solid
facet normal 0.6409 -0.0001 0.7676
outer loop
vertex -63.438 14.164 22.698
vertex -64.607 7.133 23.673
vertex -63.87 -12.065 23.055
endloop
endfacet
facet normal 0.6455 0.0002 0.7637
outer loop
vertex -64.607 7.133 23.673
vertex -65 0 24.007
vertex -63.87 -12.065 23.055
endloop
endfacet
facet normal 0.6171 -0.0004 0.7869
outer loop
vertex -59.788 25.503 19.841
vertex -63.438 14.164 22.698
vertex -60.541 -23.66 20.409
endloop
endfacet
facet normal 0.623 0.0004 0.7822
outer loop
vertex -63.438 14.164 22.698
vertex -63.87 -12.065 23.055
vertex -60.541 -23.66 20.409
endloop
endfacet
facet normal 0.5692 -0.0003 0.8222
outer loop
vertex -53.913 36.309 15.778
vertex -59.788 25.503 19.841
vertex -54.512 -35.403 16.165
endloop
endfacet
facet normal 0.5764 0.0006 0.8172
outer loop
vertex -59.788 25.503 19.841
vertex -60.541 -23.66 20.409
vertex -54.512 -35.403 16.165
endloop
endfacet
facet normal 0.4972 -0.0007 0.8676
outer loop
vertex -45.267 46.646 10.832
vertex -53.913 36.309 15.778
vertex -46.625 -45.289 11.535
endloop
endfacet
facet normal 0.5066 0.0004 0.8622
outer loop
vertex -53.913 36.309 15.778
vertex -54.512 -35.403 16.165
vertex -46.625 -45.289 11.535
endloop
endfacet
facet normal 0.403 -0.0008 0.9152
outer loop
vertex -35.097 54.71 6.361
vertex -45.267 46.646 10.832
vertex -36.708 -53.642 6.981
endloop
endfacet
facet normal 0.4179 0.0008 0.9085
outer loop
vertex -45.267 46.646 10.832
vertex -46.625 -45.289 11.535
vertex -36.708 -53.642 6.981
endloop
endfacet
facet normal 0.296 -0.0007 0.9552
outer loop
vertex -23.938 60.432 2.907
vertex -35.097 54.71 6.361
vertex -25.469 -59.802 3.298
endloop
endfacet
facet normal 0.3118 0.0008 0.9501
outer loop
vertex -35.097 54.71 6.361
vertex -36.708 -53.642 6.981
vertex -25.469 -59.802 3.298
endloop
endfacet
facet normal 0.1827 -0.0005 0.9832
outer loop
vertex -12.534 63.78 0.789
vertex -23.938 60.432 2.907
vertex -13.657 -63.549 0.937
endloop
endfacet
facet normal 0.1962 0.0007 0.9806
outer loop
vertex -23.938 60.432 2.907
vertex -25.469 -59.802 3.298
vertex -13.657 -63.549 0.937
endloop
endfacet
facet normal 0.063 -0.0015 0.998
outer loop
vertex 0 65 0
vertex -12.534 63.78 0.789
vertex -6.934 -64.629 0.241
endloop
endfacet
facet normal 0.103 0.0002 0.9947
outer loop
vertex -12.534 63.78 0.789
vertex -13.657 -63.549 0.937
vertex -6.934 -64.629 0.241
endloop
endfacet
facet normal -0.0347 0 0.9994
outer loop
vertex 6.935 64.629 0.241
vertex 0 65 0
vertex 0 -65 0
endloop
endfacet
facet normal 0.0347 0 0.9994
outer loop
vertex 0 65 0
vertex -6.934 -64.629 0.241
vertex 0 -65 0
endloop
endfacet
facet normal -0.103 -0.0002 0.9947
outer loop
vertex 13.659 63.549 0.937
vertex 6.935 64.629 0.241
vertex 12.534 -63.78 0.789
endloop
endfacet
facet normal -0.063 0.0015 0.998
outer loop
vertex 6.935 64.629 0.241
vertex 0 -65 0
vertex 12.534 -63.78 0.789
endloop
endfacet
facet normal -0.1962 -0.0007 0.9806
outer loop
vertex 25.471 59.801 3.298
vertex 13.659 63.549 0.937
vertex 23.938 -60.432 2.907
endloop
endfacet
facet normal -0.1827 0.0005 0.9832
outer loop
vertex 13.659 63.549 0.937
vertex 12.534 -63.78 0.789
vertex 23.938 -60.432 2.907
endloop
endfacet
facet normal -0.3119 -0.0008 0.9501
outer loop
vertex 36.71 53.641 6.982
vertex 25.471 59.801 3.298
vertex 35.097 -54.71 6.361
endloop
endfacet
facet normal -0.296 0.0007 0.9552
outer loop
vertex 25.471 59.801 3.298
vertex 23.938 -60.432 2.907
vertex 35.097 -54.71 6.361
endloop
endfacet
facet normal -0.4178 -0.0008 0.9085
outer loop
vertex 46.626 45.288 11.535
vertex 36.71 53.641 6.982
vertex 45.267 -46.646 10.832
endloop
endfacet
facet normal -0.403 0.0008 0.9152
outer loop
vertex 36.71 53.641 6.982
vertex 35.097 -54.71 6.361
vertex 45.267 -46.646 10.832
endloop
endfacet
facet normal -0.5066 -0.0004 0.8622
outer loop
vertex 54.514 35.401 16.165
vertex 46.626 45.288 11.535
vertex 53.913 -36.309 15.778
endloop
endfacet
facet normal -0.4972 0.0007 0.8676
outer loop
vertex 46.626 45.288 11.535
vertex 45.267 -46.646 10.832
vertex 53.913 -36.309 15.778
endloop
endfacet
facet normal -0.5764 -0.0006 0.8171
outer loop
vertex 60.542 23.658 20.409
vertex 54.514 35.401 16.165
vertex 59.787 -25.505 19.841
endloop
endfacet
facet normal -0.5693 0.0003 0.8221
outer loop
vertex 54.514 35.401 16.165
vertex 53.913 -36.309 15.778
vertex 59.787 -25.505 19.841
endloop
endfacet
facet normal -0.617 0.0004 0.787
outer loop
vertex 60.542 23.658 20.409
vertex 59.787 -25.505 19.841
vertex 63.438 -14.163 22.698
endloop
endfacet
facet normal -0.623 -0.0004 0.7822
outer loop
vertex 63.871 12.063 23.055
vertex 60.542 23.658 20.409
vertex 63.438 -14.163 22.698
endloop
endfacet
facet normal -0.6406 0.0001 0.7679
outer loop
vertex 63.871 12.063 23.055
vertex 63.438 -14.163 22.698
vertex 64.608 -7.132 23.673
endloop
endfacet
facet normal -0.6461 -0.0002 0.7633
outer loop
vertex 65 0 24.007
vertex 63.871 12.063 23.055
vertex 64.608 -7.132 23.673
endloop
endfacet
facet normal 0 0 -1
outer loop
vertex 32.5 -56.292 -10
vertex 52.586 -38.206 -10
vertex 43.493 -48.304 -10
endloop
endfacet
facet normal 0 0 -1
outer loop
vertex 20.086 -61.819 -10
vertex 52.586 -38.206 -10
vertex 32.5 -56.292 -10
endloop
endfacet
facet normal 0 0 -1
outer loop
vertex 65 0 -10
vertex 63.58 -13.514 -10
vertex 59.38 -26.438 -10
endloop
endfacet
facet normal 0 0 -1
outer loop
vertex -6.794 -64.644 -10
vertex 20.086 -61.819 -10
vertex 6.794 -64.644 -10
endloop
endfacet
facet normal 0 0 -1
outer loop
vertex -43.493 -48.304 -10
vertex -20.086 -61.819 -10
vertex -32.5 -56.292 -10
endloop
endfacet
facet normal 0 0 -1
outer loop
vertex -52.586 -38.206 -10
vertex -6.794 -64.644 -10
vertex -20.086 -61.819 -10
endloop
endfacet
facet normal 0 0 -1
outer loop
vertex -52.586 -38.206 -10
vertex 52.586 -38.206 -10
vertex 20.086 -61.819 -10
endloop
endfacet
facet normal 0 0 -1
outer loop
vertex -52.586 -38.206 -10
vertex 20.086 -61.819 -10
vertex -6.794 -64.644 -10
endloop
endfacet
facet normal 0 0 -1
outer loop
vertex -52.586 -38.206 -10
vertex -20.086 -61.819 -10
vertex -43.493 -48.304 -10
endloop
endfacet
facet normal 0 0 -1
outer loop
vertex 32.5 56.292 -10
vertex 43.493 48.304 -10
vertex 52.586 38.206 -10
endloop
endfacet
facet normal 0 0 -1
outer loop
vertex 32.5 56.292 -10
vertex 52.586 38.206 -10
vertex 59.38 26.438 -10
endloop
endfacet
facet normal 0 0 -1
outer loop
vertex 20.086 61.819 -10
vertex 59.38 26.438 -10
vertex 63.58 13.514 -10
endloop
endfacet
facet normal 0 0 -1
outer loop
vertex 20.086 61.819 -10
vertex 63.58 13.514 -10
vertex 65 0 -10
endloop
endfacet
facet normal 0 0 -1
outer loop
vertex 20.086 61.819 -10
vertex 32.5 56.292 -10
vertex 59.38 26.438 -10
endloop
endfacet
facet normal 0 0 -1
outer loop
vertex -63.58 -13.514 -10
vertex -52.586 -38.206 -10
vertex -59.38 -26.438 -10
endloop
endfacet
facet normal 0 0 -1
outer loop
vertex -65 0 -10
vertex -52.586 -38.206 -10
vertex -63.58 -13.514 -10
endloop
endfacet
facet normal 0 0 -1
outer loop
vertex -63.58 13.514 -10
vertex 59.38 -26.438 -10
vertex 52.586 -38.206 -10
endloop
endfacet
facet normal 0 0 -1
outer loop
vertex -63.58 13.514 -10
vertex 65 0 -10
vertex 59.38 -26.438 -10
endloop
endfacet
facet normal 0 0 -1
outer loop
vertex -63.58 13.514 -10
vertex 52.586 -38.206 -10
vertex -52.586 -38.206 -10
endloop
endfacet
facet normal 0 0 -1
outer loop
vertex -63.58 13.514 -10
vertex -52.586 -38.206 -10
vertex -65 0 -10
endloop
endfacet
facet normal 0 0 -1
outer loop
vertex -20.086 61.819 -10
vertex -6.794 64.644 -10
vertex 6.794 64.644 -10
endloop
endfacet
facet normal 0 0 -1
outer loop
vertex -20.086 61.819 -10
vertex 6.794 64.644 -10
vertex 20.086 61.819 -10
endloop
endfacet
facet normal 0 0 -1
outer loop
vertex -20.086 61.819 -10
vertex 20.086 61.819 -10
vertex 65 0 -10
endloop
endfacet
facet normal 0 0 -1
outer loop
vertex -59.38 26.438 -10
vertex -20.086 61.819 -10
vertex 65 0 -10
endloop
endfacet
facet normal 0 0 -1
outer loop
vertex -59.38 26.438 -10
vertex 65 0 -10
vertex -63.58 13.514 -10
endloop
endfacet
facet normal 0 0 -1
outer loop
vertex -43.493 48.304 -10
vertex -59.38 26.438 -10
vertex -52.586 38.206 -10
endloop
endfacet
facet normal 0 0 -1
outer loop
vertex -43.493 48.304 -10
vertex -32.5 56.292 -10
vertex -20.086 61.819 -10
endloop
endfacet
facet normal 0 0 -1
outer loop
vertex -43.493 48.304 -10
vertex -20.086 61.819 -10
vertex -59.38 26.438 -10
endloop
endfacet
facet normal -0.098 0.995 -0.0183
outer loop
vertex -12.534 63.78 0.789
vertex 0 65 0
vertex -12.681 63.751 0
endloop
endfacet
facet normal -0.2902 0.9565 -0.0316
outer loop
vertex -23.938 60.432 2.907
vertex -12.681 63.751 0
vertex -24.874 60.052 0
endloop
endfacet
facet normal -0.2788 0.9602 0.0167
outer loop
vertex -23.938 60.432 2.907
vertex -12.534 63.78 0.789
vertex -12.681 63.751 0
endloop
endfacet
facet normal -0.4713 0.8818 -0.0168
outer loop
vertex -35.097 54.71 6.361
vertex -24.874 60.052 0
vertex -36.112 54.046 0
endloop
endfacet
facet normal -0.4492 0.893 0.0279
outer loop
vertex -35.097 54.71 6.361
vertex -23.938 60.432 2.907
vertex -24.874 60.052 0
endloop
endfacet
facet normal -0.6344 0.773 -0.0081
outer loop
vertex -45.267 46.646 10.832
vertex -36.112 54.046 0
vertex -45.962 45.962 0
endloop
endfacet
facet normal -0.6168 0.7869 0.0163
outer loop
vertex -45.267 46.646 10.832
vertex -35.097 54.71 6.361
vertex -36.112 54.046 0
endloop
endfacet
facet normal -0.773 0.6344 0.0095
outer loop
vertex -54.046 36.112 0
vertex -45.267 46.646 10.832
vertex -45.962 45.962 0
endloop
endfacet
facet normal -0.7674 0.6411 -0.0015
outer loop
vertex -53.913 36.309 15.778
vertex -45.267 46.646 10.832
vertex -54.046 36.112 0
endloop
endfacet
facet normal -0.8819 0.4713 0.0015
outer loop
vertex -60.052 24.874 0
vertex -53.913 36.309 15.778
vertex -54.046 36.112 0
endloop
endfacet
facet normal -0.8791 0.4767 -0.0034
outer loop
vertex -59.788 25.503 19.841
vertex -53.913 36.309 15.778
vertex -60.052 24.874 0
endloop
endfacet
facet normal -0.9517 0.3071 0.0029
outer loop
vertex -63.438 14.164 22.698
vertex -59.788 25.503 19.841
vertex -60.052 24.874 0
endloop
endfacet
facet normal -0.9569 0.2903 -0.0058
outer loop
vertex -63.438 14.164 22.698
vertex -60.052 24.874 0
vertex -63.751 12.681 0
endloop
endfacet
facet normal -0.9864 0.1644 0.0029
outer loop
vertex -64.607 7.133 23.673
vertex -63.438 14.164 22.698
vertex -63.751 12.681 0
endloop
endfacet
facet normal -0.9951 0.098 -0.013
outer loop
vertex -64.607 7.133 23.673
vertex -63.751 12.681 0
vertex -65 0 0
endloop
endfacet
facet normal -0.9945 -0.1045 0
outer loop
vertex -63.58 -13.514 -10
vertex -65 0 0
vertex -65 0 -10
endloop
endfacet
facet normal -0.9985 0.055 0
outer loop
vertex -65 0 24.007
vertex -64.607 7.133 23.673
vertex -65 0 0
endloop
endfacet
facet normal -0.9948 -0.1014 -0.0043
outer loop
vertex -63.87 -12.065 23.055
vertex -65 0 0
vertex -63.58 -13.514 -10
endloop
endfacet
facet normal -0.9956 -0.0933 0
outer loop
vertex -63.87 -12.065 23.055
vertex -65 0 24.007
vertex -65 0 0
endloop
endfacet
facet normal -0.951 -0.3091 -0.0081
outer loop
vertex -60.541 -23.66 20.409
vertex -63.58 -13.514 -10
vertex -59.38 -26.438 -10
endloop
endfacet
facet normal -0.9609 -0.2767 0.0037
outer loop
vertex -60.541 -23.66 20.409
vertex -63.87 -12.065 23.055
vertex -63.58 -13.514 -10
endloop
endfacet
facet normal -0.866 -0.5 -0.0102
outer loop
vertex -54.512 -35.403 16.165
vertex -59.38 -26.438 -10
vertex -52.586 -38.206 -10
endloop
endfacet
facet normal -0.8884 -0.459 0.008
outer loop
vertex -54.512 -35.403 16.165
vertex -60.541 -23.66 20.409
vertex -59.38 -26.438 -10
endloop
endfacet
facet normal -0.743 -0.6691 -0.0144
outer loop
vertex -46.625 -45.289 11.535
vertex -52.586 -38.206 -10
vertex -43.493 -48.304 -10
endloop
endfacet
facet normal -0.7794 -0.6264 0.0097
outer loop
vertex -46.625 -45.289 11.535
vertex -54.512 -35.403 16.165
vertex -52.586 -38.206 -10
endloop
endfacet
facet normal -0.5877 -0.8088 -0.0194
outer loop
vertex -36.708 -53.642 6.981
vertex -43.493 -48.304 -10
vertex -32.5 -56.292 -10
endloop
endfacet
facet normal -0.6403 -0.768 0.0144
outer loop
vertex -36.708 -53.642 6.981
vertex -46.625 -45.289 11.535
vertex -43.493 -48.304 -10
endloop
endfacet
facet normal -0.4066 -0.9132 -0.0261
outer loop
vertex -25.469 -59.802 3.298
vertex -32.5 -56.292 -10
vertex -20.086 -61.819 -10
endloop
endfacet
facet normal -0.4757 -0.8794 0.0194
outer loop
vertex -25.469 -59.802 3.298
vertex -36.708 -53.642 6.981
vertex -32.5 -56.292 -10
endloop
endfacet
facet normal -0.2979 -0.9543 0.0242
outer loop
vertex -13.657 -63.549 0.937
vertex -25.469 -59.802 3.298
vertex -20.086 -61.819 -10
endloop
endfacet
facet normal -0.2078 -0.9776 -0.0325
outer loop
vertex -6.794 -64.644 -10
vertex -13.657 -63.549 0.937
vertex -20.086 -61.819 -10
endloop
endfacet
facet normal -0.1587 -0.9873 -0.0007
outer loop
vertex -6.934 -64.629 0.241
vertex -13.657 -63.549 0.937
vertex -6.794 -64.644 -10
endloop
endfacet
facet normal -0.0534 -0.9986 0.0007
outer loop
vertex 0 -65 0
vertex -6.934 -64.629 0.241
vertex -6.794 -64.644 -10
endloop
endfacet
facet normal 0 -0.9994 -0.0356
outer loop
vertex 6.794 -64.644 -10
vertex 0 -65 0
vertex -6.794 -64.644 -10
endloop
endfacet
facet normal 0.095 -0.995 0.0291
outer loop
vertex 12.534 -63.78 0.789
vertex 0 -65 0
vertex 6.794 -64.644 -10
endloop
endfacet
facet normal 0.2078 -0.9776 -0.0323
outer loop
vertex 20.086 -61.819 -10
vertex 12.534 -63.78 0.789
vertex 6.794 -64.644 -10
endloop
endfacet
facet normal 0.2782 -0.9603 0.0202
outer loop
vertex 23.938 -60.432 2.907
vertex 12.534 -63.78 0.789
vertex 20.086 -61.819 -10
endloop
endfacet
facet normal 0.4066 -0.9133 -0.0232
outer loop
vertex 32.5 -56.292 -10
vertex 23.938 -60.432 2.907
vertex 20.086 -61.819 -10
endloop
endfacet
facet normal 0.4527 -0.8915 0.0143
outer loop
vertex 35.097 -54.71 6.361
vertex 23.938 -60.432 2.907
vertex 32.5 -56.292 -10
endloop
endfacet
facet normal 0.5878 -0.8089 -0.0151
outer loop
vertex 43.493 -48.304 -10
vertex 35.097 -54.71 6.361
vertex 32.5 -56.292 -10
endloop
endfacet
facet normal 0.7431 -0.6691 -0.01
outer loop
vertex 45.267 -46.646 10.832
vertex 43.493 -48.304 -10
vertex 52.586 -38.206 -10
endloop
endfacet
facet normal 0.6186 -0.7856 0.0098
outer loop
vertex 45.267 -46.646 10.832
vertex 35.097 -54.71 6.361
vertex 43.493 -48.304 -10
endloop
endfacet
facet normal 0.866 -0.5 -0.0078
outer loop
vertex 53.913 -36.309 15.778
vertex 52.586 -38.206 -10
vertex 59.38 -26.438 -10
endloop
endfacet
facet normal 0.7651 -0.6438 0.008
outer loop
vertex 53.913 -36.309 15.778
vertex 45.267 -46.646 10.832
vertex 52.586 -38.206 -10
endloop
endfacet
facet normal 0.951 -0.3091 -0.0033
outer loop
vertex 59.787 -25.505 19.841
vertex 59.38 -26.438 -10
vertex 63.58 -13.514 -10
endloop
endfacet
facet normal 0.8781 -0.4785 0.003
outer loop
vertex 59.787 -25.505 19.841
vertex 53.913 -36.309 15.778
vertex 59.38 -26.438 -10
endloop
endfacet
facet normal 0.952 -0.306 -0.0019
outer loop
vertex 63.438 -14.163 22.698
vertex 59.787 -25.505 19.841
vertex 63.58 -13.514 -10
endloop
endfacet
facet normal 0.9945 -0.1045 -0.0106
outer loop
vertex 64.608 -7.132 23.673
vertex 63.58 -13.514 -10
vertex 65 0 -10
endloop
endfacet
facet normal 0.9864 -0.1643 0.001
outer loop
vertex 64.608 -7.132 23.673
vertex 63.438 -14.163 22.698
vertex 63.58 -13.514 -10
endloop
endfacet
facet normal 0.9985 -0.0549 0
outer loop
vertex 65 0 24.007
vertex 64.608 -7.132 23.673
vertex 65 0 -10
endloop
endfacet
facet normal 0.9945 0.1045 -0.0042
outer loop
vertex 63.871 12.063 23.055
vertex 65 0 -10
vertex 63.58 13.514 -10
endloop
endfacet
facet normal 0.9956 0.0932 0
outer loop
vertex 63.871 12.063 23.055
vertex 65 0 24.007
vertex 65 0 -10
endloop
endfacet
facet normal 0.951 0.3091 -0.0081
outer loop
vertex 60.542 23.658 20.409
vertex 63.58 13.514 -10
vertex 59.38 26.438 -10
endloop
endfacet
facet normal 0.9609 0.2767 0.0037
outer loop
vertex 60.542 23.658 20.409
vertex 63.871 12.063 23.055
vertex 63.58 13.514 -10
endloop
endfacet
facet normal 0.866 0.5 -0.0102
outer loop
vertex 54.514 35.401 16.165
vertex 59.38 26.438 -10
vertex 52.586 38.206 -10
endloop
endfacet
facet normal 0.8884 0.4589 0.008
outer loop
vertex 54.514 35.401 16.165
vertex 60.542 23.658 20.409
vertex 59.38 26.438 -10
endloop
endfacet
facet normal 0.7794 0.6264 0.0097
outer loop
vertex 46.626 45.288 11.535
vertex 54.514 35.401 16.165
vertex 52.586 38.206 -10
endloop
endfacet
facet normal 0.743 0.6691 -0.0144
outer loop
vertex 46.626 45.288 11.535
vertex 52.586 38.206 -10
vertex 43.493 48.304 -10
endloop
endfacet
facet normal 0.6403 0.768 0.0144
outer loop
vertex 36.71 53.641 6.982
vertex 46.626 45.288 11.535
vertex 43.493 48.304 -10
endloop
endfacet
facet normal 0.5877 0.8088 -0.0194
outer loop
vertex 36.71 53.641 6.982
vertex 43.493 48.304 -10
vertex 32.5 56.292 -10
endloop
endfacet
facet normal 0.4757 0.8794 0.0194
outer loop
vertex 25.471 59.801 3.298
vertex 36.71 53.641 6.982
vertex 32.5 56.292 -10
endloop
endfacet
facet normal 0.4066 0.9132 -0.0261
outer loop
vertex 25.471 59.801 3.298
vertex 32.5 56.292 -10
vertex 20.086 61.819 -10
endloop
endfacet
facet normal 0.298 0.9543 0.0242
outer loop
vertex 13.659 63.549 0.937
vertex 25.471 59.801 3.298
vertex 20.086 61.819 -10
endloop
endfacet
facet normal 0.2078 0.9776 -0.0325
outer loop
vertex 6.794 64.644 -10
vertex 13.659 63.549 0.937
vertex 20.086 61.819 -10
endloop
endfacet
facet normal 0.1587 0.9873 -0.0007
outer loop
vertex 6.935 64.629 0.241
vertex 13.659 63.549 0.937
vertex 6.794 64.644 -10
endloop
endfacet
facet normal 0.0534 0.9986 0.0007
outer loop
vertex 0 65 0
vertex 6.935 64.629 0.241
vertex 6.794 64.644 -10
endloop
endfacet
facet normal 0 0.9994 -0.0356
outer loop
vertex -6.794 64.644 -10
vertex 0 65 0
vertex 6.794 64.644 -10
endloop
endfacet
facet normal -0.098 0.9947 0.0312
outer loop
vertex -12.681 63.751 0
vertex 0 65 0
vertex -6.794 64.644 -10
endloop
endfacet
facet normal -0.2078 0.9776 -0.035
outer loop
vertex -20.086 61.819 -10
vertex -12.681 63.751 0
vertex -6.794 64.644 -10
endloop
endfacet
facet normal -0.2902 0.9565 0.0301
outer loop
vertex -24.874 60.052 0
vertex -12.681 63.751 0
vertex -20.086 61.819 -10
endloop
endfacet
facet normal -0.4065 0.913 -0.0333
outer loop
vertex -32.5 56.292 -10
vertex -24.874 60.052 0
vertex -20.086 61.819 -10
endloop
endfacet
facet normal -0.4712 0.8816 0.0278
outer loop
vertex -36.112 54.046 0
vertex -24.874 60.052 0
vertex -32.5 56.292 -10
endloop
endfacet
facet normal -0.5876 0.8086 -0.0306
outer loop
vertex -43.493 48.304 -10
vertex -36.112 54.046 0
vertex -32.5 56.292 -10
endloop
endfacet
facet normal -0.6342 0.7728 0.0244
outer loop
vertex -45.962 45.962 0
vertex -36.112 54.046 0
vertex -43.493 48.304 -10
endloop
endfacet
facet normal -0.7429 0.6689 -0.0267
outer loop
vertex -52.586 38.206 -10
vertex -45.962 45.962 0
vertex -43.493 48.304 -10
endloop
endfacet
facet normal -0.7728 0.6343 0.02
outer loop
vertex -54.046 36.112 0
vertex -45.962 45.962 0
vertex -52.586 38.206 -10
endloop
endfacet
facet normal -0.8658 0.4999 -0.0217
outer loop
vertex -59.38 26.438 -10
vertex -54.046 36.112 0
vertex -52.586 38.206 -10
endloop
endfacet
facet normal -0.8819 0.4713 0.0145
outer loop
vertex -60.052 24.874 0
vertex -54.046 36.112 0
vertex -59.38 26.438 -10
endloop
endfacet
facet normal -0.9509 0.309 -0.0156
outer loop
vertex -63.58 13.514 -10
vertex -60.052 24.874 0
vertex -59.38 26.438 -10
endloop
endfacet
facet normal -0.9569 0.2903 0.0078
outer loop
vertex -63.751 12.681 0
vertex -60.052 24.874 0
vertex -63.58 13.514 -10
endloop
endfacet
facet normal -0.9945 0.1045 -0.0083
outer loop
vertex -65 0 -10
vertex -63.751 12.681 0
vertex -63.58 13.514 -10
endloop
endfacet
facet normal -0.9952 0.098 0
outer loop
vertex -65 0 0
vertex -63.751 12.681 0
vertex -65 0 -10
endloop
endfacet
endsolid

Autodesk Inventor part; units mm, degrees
ref_plane "XZ Plane" through (0, 0, 0) normal (0, 1, 0) x (-1, 0, 0)
ref_plane "XY Plane" through (0, 0, 0) normal (0, 0, 1) x (1, 0, 0)
sketch "Sketch1" plane through (0, 0, 0) normal (0, 0, 1) x (1, 0, 0)
  circle A0 centre (0, 0) radius 65
  dimension "d0" = 130
extrude "Extrusion1" add sketch "Sketch1" along normal blind 25
ref_plane "Work Plane1" through (0, 0, 0) normal (0, 1, 0) x (0, 0, 1)
sketch "Sketch2" plane through (0, 0, 0) normal (0, 1, 0) x (0, 0, 1)
  circle A0 centre (100, 0) radius 100
  line L0 (0, 65) -> (0, -65) projected
  point P0 (0, 0)
  dimension "d4" = 200
extrude "Extrusion2" cut sketch "Sketch2" along normal mid plane 130
sketch "Sketch3" plane through (0, 0, 0) normal (0, 0, -1) x (-1, 0, 0)
  circle A0 centre (0, 0) radius 65
extrude "Extrusion3" add sketch "Sketch3" along normal blind 10
ref_plane "Work Plane2" through (0, 0, 0) normal (-1, 0, 0) x (0, 0, 1)
properties part number "DiscoSuporteInterno" material "Nickel-Copper Alloy 400"
